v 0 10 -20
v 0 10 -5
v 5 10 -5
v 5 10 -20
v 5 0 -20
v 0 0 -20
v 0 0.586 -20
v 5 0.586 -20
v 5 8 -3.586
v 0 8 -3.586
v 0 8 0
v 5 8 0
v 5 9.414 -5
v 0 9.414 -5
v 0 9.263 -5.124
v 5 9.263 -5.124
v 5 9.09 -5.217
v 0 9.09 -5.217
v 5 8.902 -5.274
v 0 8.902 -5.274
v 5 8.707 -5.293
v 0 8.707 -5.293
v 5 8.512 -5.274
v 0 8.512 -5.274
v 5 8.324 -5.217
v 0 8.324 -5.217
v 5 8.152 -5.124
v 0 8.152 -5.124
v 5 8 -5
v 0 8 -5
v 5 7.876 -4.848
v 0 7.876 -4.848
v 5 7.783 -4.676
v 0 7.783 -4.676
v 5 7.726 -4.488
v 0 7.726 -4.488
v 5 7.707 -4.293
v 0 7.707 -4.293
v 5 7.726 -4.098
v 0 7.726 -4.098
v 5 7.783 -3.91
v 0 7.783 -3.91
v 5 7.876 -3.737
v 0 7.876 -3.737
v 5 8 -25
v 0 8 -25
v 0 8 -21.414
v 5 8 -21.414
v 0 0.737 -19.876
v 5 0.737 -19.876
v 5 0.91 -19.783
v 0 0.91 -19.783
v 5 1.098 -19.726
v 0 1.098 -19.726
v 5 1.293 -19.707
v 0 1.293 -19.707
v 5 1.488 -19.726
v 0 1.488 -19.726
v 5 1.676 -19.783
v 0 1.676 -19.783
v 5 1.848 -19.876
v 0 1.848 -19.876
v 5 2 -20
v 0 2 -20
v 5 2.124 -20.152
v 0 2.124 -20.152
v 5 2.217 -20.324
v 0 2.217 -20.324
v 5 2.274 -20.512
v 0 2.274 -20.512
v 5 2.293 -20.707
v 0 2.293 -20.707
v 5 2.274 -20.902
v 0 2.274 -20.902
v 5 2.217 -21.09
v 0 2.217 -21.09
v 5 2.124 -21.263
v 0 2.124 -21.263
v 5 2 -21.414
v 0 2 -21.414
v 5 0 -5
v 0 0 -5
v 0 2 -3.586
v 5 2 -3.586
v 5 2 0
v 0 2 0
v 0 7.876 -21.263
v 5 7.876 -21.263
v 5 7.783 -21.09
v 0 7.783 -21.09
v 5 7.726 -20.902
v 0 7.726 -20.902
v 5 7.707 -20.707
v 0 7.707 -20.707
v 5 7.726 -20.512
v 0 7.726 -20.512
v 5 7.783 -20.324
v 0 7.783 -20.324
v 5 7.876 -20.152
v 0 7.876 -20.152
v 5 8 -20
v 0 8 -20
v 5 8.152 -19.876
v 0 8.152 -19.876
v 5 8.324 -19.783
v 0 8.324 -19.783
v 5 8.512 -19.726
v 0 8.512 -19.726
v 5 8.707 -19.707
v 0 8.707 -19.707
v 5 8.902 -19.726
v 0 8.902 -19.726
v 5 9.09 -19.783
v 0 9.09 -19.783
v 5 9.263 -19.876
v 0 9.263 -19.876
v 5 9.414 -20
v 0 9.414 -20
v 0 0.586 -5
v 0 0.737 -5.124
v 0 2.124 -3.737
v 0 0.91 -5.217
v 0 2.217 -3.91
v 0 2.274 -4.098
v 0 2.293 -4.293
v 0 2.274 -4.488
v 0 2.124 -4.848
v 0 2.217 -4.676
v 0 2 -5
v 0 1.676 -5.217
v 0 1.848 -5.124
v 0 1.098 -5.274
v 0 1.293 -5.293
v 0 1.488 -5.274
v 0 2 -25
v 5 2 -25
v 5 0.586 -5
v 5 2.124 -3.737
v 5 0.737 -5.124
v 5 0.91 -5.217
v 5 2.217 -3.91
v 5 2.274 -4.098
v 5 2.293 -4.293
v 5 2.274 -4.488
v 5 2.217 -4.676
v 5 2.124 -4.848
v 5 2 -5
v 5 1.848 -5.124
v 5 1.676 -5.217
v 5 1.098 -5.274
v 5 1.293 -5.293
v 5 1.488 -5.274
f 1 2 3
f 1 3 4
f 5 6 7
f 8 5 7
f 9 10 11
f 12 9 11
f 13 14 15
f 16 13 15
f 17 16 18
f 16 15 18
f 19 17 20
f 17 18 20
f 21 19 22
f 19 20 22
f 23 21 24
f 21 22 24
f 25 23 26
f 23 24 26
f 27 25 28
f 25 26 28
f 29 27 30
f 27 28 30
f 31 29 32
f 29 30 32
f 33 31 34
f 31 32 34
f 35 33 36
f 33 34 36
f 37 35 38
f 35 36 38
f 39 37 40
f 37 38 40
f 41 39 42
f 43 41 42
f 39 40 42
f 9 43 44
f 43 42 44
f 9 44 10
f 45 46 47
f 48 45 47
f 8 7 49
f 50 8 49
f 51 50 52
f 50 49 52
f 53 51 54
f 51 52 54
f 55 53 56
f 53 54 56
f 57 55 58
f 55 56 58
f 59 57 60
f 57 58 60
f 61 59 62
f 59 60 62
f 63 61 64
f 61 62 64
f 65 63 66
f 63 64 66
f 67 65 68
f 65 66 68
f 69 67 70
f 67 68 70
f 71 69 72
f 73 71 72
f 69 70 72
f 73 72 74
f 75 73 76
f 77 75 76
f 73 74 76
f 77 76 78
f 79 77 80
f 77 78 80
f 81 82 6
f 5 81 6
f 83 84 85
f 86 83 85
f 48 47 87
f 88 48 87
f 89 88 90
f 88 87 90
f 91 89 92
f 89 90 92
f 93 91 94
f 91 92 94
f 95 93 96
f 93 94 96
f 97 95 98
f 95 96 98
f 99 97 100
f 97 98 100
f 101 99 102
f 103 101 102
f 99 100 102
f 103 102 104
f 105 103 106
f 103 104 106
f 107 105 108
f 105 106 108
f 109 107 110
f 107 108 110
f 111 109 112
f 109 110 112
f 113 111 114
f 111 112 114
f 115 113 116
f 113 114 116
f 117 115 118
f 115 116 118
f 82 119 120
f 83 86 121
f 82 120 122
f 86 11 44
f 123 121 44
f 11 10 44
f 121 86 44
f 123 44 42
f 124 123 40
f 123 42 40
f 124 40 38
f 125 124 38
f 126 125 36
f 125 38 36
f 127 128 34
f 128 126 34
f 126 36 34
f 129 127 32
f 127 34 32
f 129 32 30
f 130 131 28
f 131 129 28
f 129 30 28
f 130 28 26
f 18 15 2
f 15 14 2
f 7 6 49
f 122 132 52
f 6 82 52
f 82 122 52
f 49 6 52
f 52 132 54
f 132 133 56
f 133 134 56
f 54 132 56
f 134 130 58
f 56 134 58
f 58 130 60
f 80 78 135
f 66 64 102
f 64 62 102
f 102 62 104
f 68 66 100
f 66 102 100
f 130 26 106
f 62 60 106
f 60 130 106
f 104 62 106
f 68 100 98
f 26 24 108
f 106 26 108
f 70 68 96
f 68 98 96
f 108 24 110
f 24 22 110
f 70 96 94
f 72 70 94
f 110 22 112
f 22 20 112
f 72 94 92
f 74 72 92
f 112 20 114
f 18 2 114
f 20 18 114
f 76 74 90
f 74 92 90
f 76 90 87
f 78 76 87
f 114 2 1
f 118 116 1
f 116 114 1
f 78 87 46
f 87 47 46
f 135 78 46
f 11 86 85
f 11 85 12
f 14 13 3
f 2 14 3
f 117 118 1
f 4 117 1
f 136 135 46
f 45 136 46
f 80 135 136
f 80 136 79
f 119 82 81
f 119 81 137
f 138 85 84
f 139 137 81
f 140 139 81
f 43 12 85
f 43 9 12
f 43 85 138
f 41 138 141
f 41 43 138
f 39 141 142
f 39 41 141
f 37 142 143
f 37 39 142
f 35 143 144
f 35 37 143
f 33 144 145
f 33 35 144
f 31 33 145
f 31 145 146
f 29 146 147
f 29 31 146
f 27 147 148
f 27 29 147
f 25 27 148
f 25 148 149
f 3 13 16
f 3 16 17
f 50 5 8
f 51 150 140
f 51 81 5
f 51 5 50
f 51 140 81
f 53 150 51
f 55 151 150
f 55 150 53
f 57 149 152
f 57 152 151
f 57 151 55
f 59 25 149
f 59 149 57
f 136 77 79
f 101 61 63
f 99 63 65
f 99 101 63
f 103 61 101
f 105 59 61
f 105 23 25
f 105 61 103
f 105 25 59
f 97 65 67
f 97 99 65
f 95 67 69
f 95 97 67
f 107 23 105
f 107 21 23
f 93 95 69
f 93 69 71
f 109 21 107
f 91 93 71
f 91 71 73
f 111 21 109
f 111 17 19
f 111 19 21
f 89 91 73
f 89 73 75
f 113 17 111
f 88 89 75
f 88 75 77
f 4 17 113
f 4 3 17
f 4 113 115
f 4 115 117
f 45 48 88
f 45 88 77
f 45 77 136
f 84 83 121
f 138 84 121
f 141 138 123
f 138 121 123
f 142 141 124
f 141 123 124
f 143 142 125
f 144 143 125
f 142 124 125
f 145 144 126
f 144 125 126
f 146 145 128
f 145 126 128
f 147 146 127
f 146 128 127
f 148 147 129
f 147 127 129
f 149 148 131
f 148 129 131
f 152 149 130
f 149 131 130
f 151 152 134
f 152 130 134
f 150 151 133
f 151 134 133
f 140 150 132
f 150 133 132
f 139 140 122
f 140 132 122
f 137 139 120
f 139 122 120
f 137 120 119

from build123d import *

# Parameters (mm, degrees)
SKETCH_1_W          = 25
SKETCH_1_H          = 10
EXTRUDE_1_DEPTH     = 5
SKETCH_2_W          = 5
SKETCH_2_H          = 2
CUT_EXTRUDE_1_DEPTH = 10
SKETCH_4_R          = 1
CUT_EXTRUDE_2_DEPTH = 10


with BuildPart() as part:
    # 스케치1 → 보스-돌출1 (new body)
    with BuildSketch(Plane(origin=(0, 0, 0), x_dir=(0, 0, -1), z_dir=(1, 0, 0))):
        with Locations((12.5, 5)):
            Rectangle(SKETCH_1_W, SKETCH_1_H)
    extrude(amount=EXTRUDE_1_DEPTH)

    # 스케치2 → 컷-돌출1 (cut)
    with BuildSketch(Plane.ZY):
        with Locations((-2.5, 1)):
            Rectangle(SKETCH_2_W, SKETCH_2_H)
        with Locations((-2.5, 9)):
            Rectangle(SKETCH_2_W, SKETCH_2_H)
        with Locations((-22.5, 9)):
            Rectangle(SKETCH_2_W, SKETCH_2_H)
        with Locations((-22.5, 1)):
            Rectangle(SKETCH_2_W, SKETCH_2_H)
    extrude(amount=-CUT_EXTRUDE_1_DEPTH, mode=Mode.SUBTRACT)

    # 스케치4 → 컷-돌출2 (cut)
    with BuildSketch(Plane.ZY):
        with Locations((-4.292893219, 8.707106781)):
            Circle(SKETCH_4_R)
        with Locations((-4.292893219, 1.292893219)):
            Circle(SKETCH_4_R)
        with Locations((-20.707106781, 1.292893219)):
            Circle(SKETCH_4_R)
        with Locations((-20.707106781, 8.707106781)):
            Circle(SKETCH_4_R)
    extrude(amount=-CUT_EXTRUDE_2_DEPTH, mode=Mode.SUBTRACT)


solid = part.part
